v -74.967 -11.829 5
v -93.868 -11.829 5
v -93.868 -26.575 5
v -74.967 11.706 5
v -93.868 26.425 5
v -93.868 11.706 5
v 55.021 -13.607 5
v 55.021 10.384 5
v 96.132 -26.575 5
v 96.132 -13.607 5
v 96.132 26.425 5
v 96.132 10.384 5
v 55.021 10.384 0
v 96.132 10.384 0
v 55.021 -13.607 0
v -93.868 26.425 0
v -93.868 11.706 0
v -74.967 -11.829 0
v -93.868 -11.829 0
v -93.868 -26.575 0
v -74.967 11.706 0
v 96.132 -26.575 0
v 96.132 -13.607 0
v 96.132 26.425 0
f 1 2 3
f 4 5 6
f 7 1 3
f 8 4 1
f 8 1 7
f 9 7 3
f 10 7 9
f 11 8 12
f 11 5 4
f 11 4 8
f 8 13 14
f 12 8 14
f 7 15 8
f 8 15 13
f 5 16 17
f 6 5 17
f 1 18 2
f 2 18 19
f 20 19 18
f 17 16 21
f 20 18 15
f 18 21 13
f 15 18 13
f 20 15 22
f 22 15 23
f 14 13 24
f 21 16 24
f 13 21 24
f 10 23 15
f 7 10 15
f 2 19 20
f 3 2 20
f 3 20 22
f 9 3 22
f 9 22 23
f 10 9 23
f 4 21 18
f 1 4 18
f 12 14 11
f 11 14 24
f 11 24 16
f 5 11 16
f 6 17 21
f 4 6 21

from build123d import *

# Parameters (mm, degrees)
F1_DEPTH = 5
F0_W     = 41.110674
F0_H     = 23.991064
F2_DEPTH = 25
F3_DEPTH = 25


with BuildPart() as f1:
    # F0 (on Top) → F1 (new body)
    with BuildSketch(Plane.XY):
        Polygon((96.131777, 26.425483), (-93.868223, 26.425483), (-93.868223, 11.705574), (-74.966818, 11.705574), (-74.966818, -11.828702), (-93.868223, -11.828702), (-93.868223, -14.370874), (-93.868223, -26.574517), (96.131777, -26.574517), (96.131777, -13.606817), (55.021103, -13.606817), (55.021103, 10.384247), (96.131777, 10.384247), align=None)
    extrude(amount=F1_DEPTH)

    # F0 (on Top) → F2 (cut)
    with BuildSketch(Plane.XY):
        Polygon((96.131777, 26.425483), (-93.868223, 26.425483), (-93.868223, 11.705574), (-74.966818, 11.705574), (-74.966818, -11.828702), (-93.868223, -11.828702), (-93.868223, -14.370874), (-93.868223, -26.574517), (96.131777, -26.574517), (96.131777, -13.606817), (55.021103, -13.606817), (55.021103, 10.384247), (96.131777, 10.384247), align=None)
        Polygon((-74.966818, 11.705574), (-93.868223, 11.705574), (-93.868223, -0.074517), (-93.868223, -11.828702), (-74.966818, -11.828702), align=None)
        with Locations((75.57644, -1.611285)):
            Rectangle(F0_W, F0_H)
    extrude(amount=-F2_DEPTH, mode=Mode.SUBTRACT)

    # F0 (on Top) → F3 (cut)
    with BuildSketch(Plane.XY):
        Polygon((96.131777, 26.425483), (-93.868223, 26.425483), (-93.868223, 11.705574), (-74.966818, 11.705574), (-74.966818, -11.828702), (-93.868223, -11.828702), (-93.868223, -14.370874), (-93.868223, -26.574517), (96.131777, -26.574517), (96.131777, -13.606817), (55.021103, -13.606817), (55.021103, 10.384247), (96.131777, 10.384247), align=None)
        Polygon((-74.966818, 11.705574), (-93.868223, 11.705574), (-93.868223, -0.074517), (-93.868223, -11.828702), (-74.966818, -11.828702), align=None)
        with Locations((75.57644, -1.611285)):
            Rectangle(F0_W, F0_H)
    extrude(amount=-F3_DEPTH, mode=Mode.SUBTRACT)


solid = f1.part
